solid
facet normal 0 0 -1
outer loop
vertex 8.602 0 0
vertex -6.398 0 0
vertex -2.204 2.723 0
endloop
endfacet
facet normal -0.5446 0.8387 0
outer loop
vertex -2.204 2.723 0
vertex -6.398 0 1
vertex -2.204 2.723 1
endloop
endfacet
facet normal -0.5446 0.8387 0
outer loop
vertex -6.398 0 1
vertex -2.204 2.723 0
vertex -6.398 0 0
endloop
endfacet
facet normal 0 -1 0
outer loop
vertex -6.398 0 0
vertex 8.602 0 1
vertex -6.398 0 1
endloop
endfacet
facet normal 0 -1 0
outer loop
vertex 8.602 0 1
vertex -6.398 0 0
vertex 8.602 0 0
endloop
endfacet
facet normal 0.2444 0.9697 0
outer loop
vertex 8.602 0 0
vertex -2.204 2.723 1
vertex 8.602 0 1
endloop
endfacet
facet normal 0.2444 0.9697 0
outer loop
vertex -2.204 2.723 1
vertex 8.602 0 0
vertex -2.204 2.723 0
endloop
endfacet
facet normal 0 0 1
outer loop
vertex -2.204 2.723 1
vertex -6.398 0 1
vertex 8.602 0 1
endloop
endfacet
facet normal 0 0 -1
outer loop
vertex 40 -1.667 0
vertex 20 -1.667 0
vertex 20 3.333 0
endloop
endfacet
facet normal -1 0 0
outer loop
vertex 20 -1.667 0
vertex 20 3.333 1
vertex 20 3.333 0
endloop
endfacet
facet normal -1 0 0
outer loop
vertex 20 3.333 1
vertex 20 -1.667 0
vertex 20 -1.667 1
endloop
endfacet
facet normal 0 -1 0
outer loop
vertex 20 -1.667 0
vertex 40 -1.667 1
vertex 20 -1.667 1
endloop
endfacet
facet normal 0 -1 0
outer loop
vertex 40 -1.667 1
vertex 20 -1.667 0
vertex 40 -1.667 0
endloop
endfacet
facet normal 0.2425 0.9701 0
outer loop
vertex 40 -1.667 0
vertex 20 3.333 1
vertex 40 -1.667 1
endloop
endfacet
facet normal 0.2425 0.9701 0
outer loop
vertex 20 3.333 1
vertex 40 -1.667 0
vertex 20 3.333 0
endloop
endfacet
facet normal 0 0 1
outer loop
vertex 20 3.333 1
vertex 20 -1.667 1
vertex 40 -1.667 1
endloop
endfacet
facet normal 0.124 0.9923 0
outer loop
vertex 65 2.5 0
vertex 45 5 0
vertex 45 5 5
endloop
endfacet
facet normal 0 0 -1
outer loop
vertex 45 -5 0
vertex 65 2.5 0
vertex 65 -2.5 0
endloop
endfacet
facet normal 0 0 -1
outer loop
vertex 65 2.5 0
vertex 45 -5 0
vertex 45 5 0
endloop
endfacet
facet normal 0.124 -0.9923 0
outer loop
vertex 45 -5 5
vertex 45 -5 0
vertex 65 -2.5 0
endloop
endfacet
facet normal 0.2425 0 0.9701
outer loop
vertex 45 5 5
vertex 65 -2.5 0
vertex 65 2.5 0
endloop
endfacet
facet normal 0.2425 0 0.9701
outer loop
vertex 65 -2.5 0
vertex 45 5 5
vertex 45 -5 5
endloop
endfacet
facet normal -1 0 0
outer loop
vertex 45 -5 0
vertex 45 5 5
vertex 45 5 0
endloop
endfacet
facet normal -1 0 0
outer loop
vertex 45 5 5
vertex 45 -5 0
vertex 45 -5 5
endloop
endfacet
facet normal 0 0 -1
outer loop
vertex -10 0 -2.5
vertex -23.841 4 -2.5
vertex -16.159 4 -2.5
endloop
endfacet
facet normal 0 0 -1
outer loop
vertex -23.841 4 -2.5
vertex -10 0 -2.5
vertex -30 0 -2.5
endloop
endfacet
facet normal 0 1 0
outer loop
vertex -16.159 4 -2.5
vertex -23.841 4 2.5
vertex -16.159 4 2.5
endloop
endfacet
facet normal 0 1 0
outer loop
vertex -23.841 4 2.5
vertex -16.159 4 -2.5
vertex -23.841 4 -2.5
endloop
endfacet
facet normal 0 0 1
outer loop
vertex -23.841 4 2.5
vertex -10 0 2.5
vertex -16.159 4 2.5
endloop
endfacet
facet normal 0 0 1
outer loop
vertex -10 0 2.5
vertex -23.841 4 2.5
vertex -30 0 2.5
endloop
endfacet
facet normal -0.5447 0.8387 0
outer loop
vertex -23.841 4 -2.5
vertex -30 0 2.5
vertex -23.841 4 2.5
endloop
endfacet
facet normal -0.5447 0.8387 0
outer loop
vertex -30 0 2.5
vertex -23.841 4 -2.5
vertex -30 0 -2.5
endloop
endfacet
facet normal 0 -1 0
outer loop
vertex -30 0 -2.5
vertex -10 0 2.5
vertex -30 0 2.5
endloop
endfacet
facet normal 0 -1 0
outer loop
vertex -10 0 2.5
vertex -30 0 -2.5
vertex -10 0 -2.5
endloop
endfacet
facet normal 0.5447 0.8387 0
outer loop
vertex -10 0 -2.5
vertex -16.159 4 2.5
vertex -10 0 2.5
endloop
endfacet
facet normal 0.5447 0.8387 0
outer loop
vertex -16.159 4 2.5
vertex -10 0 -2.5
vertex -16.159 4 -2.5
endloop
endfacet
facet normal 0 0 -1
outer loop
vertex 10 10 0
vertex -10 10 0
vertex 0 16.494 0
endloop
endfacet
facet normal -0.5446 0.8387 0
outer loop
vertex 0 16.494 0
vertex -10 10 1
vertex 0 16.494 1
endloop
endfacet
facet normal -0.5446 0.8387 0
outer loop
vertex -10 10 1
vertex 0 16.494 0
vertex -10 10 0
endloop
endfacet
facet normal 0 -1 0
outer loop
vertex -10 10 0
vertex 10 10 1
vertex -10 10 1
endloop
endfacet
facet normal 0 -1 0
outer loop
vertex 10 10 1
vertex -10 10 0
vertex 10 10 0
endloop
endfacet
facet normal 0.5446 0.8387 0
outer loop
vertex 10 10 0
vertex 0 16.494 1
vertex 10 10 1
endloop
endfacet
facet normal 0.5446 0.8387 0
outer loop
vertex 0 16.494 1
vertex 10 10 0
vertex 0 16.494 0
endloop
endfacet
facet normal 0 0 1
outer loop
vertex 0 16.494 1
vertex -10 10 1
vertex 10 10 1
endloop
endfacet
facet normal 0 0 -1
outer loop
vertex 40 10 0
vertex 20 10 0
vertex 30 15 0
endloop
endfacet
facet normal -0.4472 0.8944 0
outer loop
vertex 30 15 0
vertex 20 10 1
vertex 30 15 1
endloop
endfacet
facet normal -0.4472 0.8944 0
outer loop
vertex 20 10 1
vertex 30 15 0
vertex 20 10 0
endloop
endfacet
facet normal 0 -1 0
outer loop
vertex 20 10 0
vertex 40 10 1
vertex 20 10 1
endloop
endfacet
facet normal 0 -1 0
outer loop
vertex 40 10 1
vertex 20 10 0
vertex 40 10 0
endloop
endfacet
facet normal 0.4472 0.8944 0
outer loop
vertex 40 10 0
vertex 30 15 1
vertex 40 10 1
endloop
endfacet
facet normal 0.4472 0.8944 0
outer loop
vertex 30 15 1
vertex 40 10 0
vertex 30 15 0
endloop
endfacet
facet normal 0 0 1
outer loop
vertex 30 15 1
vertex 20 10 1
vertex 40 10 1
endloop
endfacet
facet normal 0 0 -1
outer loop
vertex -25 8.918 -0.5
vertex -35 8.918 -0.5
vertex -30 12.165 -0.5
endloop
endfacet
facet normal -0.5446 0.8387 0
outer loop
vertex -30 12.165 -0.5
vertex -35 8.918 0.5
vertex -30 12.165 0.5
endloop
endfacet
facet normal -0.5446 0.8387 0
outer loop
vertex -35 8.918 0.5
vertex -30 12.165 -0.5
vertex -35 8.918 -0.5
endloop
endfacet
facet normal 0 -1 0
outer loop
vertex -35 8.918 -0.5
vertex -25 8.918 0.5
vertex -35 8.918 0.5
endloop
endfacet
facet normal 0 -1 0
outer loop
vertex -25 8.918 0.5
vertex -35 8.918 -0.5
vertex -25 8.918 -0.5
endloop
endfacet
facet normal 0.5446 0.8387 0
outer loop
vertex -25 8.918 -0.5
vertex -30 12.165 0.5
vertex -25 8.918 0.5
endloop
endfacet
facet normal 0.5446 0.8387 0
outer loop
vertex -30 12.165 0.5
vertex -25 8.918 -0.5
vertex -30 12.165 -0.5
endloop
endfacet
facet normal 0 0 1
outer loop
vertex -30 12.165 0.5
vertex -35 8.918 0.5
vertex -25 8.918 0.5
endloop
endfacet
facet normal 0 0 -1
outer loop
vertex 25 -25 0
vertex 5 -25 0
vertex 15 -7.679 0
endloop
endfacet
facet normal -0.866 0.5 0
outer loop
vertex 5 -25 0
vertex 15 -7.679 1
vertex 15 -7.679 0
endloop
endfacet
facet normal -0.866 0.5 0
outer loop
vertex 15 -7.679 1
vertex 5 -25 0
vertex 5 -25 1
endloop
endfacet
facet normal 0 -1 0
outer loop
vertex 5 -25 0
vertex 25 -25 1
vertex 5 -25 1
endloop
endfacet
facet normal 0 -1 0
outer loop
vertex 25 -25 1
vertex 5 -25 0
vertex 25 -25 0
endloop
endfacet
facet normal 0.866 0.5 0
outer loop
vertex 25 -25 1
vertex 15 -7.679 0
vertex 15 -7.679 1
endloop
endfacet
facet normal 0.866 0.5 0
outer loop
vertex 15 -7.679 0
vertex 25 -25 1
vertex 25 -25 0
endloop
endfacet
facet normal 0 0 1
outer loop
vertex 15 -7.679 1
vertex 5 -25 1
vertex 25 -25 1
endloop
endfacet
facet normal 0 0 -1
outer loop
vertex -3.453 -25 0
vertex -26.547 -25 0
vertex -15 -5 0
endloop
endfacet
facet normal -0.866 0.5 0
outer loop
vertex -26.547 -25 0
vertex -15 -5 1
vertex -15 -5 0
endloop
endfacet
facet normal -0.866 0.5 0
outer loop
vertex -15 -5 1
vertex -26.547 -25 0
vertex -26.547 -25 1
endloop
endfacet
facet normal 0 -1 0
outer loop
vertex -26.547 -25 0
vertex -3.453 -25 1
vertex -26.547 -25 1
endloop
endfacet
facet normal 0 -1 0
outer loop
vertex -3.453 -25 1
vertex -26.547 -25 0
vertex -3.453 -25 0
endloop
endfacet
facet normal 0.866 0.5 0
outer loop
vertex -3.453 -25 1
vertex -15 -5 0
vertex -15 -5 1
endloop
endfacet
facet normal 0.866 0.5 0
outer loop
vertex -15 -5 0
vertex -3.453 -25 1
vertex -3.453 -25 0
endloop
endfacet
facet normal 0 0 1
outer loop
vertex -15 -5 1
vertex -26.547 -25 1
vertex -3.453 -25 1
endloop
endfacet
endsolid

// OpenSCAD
/*
Triangles.scad
 Author: Tim Koopman
 https://github.com/tkoopman/Delta-Diamond/blob/master/OpenSCAD/Triangles.scad
 [Edit: https://www.thingiverse.com/thing:220868/files]

         angleCA
           /|\
        a / H \ c
         /  |  \
 angleAB ------- angleBC
            b

Standard Parameters
  center: true/false
    If true same as centerXYZ = [true, true, true]

  centerXYZ: Vector of 3 true/false values [CenterX, CenterY, CenterZ]
    center must be left undef

  height: The 3D height of the Triangle. Ignored if heights defined

  heights: Vector of 3 height values heights @ [angleAB, angleBC, angleCA]
    If CenterZ is true each height will be centered individually, this means
    the shape will be different depending on CenterZ. Most times you will want
    CenterZ to be true to get the shape most people want.
*/

/*
Triangle
  a: Length of side a
  b: Length of side b
  angle: angle at point angleAB
*/
module Triangle(
      a, b, angle, height=1, heights=undef,
      center=undef, centerXYZ=[false,false,false])
{
  // Calculate Heights at each point
  heightAB = ((heights==undef) ? height : heights[0])/2;
  heightBC = ((heights==undef) ? height : heights[1])/2;
  heightCA = ((heights==undef) ? height : heights[2])/2;
  centerZ = (center || (center==undef && centerXYZ[2]))?0:max(heightAB,heightBC,heightCA);

  // Calculate Offsets for centering
  offsetX = (center || (center==undef && centerXYZ[0]))?((cos(angle)*a)+b)/3:0;
  offsetY = (center || (center==undef && centerXYZ[1]))?(sin(angle)*a)/3:0;

  pointAB1 = [-offsetX,-offsetY, centerZ-heightAB];
  pointAB2 = [-offsetX,-offsetY, centerZ+heightAB];
  pointBC1 = [b-offsetX,-offsetY, centerZ-heightBC];
  pointBC2 = [b-offsetX,-offsetY, centerZ+heightBC];
  pointCA1 = [(cos(angle)*a)-offsetX,(sin(angle)*a)-offsetY, centerZ-heightCA];
  pointCA2 = [(cos(angle)*a)-offsetX,(sin(angle)*a)-offsetY, centerZ+heightCA];

  polyhedron(
    points=[  pointAB1, pointBC1, pointCA1,
          pointAB2, pointBC2, pointCA2 ],
    faces=[
      [0, 1, 2],
      [3, 5, 4],
      [0, 3, 1],
      [1, 3, 4],
      [1, 4, 2],
      [2, 4, 5],
      [2, 5, 0],
      [0, 5, 3] ] );
}

/*
Isosceles Triangle
  Exactly 2 of the following paramaters must be defined.
  If all 3 defined H will be ignored.
  b: length of side b
  angle: angle at points angleAB & angleBC.
*/
module Isosceles_Triangle(
      b, angle, H=undef, height=1, heights=undef,
      center=undef, centerXYZ=[true, false, false])
{
  valid =   (angle!=undef)?((angle < 90) && (b!=undef||H!=undef)) : (b!=undef&&H!=undef);
  ANGLE = (angle!=undef) ? angle : atan(H / (b/2));
  a = (b==undef)?(H/sin((180-(angle*2))/2)) :
     (b / cos(ANGLE))/2;
  B = (b==undef)? (cos(angle)*a)*2:b;
  if (valid)
  {
    Triangle(a=a, b=B, angle=ANGLE, height=height, heights=heights,
          center=center, centerXYZ=centerXYZ);
  } else {
    echo("Invalid Isosceles_Triangle. Must specify any 2 of b, angle and H, and if angle used angle must be less than 90");
  }
}

/*
Right Angled Triangle
  Create a Right Angled Triangle where the hypotenuse will be calculated.

       |\
      a| \
       |  \
       ----
         b
  a: length of side a
  b: length of side b
*/
module Right_Angled_Triangle(
      a, b, height=1, heights=undef,
      center=undef, centerXYZ=[false, false, false])
{
  Triangle(a=a, b=b, angle=90, height=height, heights=heights,
        center=center, centerXYZ=centerXYZ);
}

/*
Wedge
  Is same as Right Angled Triangle with 2 different heights, and rotated.
  Good for creating support structures.
*/
module Wedge(a, b, w1, w2)
{
  rotate([90,0,0])
    Right_Angled_Triangle(a, b, heights=[w1, w2, w1], centerXYZ=[false, false, true]);
}

/*
Equilateral Triangle
  Create a Equilateral Triangle.

  l: Length of all sides (a, b & c)
  H: Triangle size will be based on the this 2D height
    When using H, l is ignored.
*/
module Equilateral_Triangle(
      l=10, H=undef, height=1, heights=undef,
      center=undef, centerXYZ=[true,false,false])
{
  L = (H==undef)?l:H/sin(60);
  Triangle(a=L,b=L,angle=60,height=height, heights=heights,
        center=center, centerXYZ=centerXYZ);
}

/*
Trapezoid
  Create a Basic Trapezoid (Based on Isosceles_Triangle)

            d
          /----\
         /  |   \
     a  /   H    \ c
       /    |     \
 angle ------------ angle
            b

  b: Length of side b
  angle: Angle at points angleAB & angleBC
  H: The 2D height at which the triangle should be cut to create the trapezoid
  heights: If vector of size 3 (Standard for triangles) both cd & da will be the same height, if vector have 4 values [ab,bc,cd,da] than each point can have different heights.
*/
module Trapezoid(
      b, angle=60, H, height=1, heights=undef,
      center=undef, centerXYZ=[true,false,false])
{
  validAngle = (angle < 90);
  adX = H / tan(angle);

  // Calculate Heights at each point
  heightAB = ((heights==undef) ? height : heights[0])/2;
  heightBC = ((heights==undef) ? height : heights[1])/2;
  heightCD = ((heights==undef) ? height : heights[2])/2;
  heightDA = ((heights==undef) ? height : ((len(heights) > 3)?heights[3]:heights[2]))/2;

  // Centers
  centerX = (center || (center==undef && centerXYZ[0]))?0:b/2;
  centerY = (center || (center==undef && centerXYZ[1]))?0:H/2;
  centerZ = (center || (center==undef && centerXYZ[2]))?0:max(heightAB,heightBC,heightCD,heightDA);

  // Points
  y = H/2;
  bx = b/2;
  dx = (b-(adX*2))/2;

  pointAB1 = [centerX-bx, centerY-y, centerZ-heightAB];
  pointAB2 = [centerX-bx, centerY-y, centerZ+heightAB];
  pointBC1 = [centerX+bx, centerY-y, centerZ-heightBC];
  pointBC2 = [centerX+bx, centerY-y, centerZ+heightBC];
  pointCD1 = [centerX+dx, centerY+y, centerZ-heightCD];
  pointCD2 = [centerX+dx, centerY+y, centerZ+heightCD];
  pointDA1 = [centerX-dx, centerY+y, centerZ-heightDA];
  pointDA2 = [centerX-dx, centerY+y, centerZ+heightDA];

  validH = (adX < b/2);

  if (validAngle && validH)
  {
    polyhedron(
      points=[  pointAB1, pointBC1, pointCD1, pointDA1,
            pointAB2, pointBC2, pointCD2, pointDA2 ],
      triangles=[
        [0, 1, 2],
        [0, 2, 3],
        [4, 6, 5],
        [4, 7, 6],
        [0, 4, 1],
        [1, 4, 5],
        [1, 5, 2],
        [2, 5, 6],
        [2, 6, 3],
        [3, 6, 7],
        [3, 7, 0],
        [0, 7, 4]  ] );
  } else {
    if (!validAngle) echo("Trapezoid invalid, angle must be less than 90");
    else echo("Trapezoid invalid, H is larger than triangle");
  }
}


// Examples
Triangle(a=5, b=15, angle=33, centerXYZ=[true,false,false]);
translate([20,0,0]) Right_Angled_Triangle(a=5, b=20, centerXYZ=[false,true,false]);
translate([45,0,0]) Wedge(a=5, b=20, w1=10, w2=5);
translate([-20,0,0]) Trapezoid(b=20, angle=33, H=4, height=5, centerXYZ=[true,false,true]);

translate([0,10,0]) Isosceles_Triangle(b=20, angle=33);
translate([30,10,0]) Isosceles_Triangle(b=20, H=5);
translate([-30,10,0]) Isosceles_Triangle(angle=33, H=5, center=true);

translate([15,-25,0]) Equilateral_Triangle(l=20);
translate([-15,-25,0]) Equilateral_Triangle(H=20);
